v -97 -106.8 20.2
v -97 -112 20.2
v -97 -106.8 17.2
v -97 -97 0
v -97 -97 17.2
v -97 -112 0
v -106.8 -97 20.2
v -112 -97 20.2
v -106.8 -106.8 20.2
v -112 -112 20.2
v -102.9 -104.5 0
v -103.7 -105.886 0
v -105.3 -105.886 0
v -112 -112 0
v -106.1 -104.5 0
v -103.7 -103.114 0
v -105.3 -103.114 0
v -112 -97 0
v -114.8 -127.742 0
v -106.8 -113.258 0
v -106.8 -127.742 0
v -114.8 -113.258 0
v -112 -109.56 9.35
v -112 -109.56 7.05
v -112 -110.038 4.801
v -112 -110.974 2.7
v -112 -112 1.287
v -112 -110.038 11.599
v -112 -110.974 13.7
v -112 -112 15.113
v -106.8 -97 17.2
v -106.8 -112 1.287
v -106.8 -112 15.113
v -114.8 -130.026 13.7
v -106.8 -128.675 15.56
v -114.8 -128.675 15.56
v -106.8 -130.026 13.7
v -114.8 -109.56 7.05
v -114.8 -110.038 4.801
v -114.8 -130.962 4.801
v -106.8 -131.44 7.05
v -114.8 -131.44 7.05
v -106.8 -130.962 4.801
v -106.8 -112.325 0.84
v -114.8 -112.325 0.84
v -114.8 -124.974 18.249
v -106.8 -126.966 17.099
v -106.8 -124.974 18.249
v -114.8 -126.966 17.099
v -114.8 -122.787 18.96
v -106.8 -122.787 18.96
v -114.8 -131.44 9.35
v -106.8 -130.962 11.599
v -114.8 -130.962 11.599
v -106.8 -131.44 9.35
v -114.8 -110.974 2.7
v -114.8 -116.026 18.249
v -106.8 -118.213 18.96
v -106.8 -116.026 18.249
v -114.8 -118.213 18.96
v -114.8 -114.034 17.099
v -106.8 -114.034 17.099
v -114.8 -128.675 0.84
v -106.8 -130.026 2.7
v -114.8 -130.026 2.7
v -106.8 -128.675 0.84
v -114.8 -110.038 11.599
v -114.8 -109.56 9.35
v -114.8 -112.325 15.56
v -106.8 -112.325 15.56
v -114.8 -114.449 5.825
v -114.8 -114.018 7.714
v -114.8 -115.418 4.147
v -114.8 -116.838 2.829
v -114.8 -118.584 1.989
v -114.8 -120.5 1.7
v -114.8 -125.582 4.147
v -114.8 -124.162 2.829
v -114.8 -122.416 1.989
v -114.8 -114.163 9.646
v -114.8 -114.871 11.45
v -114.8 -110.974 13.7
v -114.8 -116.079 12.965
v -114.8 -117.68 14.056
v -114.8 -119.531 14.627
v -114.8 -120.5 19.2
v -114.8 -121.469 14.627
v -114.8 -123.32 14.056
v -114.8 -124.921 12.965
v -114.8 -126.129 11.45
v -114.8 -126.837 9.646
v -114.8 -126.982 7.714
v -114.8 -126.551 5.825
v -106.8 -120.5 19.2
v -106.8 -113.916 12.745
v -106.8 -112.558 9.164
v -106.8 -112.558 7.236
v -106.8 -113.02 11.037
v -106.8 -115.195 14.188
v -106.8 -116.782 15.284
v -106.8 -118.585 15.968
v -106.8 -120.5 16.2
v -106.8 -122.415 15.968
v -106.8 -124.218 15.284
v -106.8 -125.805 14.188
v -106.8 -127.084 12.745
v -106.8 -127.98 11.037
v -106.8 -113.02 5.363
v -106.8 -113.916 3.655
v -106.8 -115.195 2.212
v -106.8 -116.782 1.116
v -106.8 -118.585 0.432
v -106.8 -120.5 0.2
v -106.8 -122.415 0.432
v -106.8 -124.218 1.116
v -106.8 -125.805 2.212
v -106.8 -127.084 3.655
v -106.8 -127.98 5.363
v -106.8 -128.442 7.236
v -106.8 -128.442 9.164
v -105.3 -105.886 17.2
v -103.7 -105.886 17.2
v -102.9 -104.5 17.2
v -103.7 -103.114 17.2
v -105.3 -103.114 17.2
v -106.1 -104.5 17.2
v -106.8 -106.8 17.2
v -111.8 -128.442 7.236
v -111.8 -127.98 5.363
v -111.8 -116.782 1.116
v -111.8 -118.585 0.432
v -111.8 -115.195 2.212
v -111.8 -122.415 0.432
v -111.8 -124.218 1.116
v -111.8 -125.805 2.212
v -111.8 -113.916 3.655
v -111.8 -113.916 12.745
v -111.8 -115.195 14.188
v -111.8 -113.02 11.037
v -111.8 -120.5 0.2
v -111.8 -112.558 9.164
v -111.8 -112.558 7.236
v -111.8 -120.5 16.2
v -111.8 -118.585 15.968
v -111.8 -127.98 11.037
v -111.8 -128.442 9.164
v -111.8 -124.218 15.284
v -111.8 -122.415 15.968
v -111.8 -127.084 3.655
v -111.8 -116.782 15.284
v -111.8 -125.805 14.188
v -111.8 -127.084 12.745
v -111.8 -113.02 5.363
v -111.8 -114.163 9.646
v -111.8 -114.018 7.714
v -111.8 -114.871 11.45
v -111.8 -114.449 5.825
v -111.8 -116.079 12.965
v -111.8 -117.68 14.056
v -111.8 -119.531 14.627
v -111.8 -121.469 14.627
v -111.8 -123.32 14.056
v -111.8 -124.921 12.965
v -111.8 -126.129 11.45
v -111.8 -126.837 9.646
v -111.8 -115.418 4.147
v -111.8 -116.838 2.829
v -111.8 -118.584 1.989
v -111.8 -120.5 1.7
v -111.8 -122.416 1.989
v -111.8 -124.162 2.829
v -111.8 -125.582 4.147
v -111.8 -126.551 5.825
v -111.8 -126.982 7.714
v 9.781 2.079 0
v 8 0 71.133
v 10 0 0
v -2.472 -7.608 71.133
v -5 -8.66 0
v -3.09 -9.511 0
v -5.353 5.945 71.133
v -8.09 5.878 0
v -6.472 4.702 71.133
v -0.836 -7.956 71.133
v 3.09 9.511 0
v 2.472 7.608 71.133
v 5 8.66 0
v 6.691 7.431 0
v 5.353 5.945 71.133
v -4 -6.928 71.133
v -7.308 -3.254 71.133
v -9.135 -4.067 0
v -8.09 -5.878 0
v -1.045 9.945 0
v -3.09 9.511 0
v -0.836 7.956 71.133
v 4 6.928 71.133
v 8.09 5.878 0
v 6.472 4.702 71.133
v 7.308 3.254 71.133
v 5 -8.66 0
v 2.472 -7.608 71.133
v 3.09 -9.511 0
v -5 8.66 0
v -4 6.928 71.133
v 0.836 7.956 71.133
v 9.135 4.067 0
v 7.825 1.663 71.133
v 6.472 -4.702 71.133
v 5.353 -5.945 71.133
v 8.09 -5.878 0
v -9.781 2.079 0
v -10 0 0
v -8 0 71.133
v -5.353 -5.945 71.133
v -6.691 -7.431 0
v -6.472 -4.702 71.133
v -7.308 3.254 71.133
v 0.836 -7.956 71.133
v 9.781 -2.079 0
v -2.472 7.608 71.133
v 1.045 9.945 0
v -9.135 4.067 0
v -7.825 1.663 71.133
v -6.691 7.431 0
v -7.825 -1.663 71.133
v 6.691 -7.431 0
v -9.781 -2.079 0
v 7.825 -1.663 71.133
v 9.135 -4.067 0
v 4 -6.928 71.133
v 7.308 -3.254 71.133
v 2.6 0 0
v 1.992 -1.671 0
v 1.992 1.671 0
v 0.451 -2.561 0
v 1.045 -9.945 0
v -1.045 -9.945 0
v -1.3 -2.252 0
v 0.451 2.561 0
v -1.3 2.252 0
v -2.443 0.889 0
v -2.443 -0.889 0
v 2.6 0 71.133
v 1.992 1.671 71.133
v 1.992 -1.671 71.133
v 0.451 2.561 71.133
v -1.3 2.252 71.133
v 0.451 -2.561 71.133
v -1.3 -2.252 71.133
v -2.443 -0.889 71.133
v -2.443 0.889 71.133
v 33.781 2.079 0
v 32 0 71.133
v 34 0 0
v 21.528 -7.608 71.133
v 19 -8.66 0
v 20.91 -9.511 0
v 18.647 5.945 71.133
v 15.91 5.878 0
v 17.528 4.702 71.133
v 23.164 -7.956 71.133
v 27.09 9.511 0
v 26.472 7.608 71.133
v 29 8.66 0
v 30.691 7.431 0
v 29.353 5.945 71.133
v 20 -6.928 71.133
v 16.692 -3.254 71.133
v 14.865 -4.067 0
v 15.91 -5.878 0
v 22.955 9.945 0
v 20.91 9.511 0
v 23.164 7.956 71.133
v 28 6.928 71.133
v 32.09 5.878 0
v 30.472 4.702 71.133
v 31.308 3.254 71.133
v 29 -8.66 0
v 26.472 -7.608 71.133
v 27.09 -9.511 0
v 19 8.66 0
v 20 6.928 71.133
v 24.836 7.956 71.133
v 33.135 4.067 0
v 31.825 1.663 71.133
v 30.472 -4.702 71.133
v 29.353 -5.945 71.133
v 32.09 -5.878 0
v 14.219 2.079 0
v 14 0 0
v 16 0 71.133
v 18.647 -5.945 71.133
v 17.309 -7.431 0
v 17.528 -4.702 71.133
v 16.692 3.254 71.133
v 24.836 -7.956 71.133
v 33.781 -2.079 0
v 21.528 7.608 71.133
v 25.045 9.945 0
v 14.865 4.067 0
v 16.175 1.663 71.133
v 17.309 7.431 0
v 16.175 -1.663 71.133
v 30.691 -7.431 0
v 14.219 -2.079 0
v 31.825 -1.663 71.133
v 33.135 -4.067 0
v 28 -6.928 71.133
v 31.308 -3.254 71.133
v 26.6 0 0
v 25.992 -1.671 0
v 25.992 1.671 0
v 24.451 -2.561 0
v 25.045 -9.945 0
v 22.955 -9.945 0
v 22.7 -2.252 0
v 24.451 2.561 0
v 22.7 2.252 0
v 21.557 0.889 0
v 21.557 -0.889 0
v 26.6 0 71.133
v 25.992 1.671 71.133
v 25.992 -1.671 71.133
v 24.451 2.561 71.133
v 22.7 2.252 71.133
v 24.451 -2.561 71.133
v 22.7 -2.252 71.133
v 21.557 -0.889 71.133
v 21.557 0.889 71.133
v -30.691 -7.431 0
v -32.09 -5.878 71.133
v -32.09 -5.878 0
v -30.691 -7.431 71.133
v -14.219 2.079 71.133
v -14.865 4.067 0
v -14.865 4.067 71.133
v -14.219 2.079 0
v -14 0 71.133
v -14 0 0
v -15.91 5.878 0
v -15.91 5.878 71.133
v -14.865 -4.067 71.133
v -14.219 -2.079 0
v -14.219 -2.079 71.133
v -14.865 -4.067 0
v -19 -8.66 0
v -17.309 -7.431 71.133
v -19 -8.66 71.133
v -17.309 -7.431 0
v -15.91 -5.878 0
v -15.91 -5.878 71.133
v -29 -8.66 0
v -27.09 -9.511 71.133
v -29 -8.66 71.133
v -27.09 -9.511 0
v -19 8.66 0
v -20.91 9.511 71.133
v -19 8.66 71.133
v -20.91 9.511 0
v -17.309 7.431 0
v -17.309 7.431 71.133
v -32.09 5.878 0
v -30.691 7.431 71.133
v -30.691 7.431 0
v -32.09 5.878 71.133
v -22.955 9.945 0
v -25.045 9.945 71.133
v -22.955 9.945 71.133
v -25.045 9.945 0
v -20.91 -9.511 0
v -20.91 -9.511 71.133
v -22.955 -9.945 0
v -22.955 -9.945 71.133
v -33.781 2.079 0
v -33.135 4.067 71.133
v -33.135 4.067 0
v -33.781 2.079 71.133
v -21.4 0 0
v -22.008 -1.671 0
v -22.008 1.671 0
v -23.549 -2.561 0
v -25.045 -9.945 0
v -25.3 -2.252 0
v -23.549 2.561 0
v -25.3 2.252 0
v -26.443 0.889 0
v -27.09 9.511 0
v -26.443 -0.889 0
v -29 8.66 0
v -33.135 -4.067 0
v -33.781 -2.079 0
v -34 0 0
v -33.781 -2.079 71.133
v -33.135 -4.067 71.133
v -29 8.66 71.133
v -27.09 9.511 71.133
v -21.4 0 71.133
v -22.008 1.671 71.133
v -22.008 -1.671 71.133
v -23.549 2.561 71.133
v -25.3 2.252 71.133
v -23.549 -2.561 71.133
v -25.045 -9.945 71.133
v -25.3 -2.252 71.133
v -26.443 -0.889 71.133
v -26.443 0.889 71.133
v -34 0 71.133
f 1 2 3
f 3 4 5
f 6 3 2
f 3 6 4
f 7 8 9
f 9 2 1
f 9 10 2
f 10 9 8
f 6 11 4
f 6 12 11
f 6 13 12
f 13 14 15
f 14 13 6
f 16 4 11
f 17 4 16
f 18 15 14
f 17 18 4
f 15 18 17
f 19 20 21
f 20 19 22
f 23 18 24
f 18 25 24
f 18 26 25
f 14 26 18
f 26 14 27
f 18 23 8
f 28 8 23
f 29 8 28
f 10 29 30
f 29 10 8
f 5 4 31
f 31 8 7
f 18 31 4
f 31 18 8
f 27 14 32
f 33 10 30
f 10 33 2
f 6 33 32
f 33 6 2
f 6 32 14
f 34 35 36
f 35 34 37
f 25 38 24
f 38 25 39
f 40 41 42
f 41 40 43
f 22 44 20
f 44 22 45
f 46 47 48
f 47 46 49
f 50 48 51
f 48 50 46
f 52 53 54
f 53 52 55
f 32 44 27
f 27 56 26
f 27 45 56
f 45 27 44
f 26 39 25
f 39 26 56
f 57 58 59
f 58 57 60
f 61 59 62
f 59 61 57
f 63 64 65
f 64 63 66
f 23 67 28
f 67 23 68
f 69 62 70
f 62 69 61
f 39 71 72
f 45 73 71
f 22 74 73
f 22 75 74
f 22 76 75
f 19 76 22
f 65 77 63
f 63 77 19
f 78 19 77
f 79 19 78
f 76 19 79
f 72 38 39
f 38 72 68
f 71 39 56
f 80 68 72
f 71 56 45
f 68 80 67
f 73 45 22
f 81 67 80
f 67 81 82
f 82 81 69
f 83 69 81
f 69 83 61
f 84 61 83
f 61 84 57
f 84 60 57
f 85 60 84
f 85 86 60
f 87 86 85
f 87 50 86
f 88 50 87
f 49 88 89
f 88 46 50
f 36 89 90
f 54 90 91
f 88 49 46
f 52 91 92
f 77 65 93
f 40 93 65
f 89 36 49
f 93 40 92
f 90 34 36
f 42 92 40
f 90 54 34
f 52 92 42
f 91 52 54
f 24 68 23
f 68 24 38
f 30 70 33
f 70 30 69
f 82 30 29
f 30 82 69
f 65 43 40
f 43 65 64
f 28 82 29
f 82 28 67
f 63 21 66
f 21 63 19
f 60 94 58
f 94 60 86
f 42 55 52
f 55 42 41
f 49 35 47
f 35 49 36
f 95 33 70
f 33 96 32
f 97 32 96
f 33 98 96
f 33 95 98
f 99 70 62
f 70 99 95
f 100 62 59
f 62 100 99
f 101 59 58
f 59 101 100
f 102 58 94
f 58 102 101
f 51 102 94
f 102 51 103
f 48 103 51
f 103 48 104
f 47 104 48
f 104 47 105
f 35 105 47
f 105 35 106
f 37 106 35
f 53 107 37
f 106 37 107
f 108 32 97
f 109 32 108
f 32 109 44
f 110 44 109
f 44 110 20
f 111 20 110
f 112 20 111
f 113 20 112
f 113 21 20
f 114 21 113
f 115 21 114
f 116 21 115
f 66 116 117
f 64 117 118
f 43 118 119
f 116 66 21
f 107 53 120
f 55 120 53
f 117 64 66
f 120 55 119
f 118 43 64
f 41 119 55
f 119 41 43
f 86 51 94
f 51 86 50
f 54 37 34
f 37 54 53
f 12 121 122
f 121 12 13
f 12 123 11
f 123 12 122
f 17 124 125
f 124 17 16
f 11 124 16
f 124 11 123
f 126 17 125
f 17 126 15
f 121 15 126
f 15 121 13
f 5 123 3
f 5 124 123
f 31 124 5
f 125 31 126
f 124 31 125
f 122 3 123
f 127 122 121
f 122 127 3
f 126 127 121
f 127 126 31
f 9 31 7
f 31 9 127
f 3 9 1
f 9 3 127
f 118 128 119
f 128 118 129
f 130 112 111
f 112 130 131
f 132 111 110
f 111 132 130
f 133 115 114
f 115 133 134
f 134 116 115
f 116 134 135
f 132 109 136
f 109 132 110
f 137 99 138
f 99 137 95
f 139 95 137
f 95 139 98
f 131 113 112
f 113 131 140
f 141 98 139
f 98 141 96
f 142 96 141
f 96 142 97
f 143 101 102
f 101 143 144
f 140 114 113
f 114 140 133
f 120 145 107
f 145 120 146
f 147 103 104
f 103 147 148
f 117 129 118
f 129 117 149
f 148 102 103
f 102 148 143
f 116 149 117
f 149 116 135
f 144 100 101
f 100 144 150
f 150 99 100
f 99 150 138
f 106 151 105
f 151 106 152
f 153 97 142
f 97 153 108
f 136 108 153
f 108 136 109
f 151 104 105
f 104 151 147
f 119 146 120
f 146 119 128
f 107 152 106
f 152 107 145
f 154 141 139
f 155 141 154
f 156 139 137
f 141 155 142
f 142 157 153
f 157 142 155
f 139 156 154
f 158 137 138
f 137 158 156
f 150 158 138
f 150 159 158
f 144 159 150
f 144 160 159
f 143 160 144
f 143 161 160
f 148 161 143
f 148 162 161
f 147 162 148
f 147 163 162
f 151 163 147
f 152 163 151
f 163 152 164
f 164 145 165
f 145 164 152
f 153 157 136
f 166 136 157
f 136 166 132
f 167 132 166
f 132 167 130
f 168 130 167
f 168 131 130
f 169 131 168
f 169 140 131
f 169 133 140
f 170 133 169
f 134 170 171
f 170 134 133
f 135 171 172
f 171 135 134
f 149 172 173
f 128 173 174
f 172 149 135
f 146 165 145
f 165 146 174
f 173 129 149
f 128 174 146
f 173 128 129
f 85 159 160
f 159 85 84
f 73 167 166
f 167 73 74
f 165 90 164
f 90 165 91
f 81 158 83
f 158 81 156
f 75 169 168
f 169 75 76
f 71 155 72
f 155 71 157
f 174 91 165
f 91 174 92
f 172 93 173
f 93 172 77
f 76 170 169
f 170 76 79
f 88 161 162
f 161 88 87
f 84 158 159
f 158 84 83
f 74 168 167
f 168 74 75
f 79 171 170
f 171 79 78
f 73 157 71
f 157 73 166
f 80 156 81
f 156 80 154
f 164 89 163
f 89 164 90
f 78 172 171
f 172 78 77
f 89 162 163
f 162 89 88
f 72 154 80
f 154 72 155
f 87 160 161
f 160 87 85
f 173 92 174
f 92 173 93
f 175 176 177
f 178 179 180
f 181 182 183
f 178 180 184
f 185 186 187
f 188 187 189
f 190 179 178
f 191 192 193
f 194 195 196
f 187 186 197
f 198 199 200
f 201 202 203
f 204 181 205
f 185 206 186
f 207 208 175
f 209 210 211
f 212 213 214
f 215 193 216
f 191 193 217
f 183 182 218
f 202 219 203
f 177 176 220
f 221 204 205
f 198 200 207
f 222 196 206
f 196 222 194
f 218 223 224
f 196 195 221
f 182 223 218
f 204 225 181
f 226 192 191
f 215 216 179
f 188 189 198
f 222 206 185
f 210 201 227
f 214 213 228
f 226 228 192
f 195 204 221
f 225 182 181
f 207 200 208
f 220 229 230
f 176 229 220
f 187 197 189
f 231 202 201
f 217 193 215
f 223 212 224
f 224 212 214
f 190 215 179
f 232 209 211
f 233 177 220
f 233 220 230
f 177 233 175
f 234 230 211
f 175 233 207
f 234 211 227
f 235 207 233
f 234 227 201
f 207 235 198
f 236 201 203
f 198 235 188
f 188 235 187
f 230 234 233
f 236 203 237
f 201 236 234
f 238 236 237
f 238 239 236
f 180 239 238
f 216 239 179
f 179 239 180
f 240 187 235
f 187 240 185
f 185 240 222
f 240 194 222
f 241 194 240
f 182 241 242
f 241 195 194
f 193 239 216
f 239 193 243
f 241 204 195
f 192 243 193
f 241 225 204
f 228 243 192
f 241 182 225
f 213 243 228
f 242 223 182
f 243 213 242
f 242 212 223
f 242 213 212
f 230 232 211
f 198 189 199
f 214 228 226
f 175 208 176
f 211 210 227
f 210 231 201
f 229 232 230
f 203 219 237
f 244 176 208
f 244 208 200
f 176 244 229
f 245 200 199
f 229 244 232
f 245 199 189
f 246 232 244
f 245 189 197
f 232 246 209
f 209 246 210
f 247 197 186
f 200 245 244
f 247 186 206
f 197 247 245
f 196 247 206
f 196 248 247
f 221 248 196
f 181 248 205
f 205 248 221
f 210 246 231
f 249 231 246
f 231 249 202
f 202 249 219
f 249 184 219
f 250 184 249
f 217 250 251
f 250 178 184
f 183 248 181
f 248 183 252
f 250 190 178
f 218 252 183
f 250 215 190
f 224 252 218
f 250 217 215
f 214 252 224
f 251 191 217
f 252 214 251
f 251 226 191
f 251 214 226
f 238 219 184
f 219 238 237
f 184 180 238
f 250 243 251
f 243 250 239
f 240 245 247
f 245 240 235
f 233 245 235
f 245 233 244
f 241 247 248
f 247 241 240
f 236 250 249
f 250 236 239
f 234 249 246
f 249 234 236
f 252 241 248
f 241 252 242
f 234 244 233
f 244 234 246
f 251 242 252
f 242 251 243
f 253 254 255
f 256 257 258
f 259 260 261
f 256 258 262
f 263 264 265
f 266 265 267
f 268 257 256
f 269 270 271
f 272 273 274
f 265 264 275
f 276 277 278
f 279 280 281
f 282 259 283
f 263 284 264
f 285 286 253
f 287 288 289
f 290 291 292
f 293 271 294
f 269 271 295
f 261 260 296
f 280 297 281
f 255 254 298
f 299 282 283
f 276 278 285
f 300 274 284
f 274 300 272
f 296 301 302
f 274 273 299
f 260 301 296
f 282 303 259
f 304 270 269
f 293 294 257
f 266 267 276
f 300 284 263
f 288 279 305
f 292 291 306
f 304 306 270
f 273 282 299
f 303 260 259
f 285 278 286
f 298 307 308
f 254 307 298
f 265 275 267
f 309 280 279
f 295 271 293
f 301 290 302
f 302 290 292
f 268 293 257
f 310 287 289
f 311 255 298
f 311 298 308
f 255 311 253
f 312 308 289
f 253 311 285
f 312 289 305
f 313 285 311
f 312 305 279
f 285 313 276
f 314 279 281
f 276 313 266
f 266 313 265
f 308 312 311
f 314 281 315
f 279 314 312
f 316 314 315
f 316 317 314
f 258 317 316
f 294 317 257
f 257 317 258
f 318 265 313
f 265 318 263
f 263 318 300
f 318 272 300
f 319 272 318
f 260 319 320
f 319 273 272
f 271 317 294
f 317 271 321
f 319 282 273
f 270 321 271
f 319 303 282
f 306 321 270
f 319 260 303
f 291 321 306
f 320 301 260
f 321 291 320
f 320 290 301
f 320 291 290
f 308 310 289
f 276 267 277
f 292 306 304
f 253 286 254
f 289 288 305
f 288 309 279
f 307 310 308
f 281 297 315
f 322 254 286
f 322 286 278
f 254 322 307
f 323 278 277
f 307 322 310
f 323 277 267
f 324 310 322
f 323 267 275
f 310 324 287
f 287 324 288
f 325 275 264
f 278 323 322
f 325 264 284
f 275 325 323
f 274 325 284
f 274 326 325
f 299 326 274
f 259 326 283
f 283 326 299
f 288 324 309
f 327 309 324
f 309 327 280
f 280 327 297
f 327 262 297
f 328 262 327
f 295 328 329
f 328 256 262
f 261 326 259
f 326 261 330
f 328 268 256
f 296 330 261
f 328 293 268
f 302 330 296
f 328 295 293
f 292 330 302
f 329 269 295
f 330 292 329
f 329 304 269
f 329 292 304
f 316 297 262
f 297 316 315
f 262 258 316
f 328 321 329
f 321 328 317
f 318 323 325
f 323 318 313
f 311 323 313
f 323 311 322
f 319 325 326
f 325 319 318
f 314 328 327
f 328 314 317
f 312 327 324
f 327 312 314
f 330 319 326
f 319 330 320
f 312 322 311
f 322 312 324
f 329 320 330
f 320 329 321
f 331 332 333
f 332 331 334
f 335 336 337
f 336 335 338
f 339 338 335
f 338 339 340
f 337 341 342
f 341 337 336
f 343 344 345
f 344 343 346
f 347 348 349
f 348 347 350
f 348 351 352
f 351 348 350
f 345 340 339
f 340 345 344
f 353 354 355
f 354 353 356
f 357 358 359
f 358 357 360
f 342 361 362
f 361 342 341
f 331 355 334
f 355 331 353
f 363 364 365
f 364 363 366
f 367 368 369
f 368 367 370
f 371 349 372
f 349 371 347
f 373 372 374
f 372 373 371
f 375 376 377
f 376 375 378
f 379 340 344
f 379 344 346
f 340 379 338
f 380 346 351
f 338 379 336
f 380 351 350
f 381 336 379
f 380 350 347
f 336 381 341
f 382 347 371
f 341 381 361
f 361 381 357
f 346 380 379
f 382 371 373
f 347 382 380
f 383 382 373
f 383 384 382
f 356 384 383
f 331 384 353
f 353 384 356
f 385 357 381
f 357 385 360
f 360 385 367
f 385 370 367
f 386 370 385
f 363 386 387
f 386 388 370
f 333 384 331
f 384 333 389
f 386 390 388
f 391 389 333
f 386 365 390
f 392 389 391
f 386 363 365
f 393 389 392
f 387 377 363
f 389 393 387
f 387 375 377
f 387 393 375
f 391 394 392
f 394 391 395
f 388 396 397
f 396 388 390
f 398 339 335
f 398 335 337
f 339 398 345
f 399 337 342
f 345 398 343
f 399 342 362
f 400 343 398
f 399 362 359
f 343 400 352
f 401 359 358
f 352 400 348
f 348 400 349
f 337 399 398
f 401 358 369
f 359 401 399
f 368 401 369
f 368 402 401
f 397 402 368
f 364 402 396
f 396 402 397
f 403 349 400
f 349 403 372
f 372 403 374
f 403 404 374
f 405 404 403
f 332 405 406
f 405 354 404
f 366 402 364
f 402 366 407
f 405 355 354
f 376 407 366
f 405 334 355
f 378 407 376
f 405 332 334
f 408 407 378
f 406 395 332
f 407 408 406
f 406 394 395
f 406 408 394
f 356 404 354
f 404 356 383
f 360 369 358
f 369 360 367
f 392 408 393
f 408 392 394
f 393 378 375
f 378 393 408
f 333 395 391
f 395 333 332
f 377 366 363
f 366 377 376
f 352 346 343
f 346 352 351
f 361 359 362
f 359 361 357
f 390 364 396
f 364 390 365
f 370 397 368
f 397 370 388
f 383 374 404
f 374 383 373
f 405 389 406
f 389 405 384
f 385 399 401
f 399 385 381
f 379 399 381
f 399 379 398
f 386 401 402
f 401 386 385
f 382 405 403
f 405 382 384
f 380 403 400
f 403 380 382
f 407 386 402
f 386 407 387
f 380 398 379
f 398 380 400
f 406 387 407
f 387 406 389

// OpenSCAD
//Design for an add-on conveyor belt for I3 3D printers.

//The belt attaches to the heated bed front and rear, reducing the build height a smidge.
//Hopefully not too much.

slop = .2;

//bed variables
bed_width = 214;
bed_screw_sep = 209;
bed_thick = 3;
bed_lift = 6.5; //6.5mm spacers under the bed.  This will likely replace them.

//screw variables
m3_rad = (3+slop)/2;

//bearing variables - 625, 5x16x5
bearing_rad = 16/2;
m5_rad = (5+slop)/2;
bearing_thick = 5;
bearing_rotary_rad = 8/2;

//roller variables
roller_rad = bearing_rad;
roller_big_rad = bearing_rad+2;
roller_len = bed_width;

%bed();

translate([-bed_screw_sep/2,-bed_screw_sep/2,0 ])
roller_mount();

//total length of roller is 214
roller();

module roller(){
    part_len = roller_len/3-slop;
    
    //angled ends
    for(i=[0:1]) translate([roller_rad*3*i,0,0]) difference(){
        cylinder(r2=roller_rad, r1=roller_big_rad, h=part_len);
        
        translate([0,0,-.1]) cylinder(r=m5_rad, h=part_len+1);
    }
    
    //straight middle
    translate([roller_rad*3*-1,0,0])
    difference(){
        cylinder(r=roller_big_rad, h=part_len);
        
        translate([0,0,-.1]) cylinder(r=m5_rad, h=part_len+1);
    }
    
}

module bed(){
    difference(){
        union(){
            translate([0,0,bed_thick/2]) cube([bed_width, bed_width, bed_thick], center=true);
        }
        for(i=[0:1]) for(j=[0:1]) mirror([i,0,0]) mirror([0,j,0]) translate([bed_screw_sep/2, bed_screw_sep/2, 0]) cylinder(r=m3_rad, h=bed_thick*3, center=true);
    }
}

//first try: one mount per corner, using the heated bed itself to square things up.
//Need to make two of these able to tension the belt, and one or two to hold a motor.
module roller_mount(){
    wall = 3;
    
    mount_width = 15;
    
    roller_drop = 1;    //distance roller is below the bed
    mount_thick = bearing_rad*2+roller_drop+slop;
    
    bed_corner  = (bed_width-bed_screw_sep)/2-slop; //the distance from screwhole center to edge of bed
    
    difference(){
        union(){
            //bed mount, + lift
            translate([0,0,(mount_thick+bed_thick)/2]) cube([mount_width, mount_width, mount_thick+bed_thick], center=true);
            
            //the bearing mount
            translate([-bearing_thick/2-bed_corner-wall/2,-bearing_rad*2, mount_thick-bearing_rad-roller_drop]) rotate([0,90,0]) cylinder(r=bearing_rad+wall, h=bearing_thick+wall, center=true);
        }
        //bed mounting hole
        cylinder(r=m3_rad, h=mount_thick*4, center=true);
        
        //cut out the bed corner
        translate([10 - bed_corner,10 - bed_corner,mount_thick+10]) cube([20,20,20], center=true);
        
        //the bearing
        translate([-bearing_thick-bed_corner,-bearing_rad*2, mount_thick-bearing_rad-roller_drop]) rotate([0,90,0]) cylinder(r=bearing_rad, h=bearing_thick+mount_thick);
        //center of bearing cutout
        translate([-bearing_thick/2-bed_corner,-bearing_rad*2, mount_thick-bearing_rad-roller_drop]) rotate([0,90,0]) cylinder(r=bearing_rad-wall/2, h=bearing_thick*3, center=true);
        
        //lop off the bottom
        translate([0,0,-50]) cube([100,100,100], center=true);
    }
}
